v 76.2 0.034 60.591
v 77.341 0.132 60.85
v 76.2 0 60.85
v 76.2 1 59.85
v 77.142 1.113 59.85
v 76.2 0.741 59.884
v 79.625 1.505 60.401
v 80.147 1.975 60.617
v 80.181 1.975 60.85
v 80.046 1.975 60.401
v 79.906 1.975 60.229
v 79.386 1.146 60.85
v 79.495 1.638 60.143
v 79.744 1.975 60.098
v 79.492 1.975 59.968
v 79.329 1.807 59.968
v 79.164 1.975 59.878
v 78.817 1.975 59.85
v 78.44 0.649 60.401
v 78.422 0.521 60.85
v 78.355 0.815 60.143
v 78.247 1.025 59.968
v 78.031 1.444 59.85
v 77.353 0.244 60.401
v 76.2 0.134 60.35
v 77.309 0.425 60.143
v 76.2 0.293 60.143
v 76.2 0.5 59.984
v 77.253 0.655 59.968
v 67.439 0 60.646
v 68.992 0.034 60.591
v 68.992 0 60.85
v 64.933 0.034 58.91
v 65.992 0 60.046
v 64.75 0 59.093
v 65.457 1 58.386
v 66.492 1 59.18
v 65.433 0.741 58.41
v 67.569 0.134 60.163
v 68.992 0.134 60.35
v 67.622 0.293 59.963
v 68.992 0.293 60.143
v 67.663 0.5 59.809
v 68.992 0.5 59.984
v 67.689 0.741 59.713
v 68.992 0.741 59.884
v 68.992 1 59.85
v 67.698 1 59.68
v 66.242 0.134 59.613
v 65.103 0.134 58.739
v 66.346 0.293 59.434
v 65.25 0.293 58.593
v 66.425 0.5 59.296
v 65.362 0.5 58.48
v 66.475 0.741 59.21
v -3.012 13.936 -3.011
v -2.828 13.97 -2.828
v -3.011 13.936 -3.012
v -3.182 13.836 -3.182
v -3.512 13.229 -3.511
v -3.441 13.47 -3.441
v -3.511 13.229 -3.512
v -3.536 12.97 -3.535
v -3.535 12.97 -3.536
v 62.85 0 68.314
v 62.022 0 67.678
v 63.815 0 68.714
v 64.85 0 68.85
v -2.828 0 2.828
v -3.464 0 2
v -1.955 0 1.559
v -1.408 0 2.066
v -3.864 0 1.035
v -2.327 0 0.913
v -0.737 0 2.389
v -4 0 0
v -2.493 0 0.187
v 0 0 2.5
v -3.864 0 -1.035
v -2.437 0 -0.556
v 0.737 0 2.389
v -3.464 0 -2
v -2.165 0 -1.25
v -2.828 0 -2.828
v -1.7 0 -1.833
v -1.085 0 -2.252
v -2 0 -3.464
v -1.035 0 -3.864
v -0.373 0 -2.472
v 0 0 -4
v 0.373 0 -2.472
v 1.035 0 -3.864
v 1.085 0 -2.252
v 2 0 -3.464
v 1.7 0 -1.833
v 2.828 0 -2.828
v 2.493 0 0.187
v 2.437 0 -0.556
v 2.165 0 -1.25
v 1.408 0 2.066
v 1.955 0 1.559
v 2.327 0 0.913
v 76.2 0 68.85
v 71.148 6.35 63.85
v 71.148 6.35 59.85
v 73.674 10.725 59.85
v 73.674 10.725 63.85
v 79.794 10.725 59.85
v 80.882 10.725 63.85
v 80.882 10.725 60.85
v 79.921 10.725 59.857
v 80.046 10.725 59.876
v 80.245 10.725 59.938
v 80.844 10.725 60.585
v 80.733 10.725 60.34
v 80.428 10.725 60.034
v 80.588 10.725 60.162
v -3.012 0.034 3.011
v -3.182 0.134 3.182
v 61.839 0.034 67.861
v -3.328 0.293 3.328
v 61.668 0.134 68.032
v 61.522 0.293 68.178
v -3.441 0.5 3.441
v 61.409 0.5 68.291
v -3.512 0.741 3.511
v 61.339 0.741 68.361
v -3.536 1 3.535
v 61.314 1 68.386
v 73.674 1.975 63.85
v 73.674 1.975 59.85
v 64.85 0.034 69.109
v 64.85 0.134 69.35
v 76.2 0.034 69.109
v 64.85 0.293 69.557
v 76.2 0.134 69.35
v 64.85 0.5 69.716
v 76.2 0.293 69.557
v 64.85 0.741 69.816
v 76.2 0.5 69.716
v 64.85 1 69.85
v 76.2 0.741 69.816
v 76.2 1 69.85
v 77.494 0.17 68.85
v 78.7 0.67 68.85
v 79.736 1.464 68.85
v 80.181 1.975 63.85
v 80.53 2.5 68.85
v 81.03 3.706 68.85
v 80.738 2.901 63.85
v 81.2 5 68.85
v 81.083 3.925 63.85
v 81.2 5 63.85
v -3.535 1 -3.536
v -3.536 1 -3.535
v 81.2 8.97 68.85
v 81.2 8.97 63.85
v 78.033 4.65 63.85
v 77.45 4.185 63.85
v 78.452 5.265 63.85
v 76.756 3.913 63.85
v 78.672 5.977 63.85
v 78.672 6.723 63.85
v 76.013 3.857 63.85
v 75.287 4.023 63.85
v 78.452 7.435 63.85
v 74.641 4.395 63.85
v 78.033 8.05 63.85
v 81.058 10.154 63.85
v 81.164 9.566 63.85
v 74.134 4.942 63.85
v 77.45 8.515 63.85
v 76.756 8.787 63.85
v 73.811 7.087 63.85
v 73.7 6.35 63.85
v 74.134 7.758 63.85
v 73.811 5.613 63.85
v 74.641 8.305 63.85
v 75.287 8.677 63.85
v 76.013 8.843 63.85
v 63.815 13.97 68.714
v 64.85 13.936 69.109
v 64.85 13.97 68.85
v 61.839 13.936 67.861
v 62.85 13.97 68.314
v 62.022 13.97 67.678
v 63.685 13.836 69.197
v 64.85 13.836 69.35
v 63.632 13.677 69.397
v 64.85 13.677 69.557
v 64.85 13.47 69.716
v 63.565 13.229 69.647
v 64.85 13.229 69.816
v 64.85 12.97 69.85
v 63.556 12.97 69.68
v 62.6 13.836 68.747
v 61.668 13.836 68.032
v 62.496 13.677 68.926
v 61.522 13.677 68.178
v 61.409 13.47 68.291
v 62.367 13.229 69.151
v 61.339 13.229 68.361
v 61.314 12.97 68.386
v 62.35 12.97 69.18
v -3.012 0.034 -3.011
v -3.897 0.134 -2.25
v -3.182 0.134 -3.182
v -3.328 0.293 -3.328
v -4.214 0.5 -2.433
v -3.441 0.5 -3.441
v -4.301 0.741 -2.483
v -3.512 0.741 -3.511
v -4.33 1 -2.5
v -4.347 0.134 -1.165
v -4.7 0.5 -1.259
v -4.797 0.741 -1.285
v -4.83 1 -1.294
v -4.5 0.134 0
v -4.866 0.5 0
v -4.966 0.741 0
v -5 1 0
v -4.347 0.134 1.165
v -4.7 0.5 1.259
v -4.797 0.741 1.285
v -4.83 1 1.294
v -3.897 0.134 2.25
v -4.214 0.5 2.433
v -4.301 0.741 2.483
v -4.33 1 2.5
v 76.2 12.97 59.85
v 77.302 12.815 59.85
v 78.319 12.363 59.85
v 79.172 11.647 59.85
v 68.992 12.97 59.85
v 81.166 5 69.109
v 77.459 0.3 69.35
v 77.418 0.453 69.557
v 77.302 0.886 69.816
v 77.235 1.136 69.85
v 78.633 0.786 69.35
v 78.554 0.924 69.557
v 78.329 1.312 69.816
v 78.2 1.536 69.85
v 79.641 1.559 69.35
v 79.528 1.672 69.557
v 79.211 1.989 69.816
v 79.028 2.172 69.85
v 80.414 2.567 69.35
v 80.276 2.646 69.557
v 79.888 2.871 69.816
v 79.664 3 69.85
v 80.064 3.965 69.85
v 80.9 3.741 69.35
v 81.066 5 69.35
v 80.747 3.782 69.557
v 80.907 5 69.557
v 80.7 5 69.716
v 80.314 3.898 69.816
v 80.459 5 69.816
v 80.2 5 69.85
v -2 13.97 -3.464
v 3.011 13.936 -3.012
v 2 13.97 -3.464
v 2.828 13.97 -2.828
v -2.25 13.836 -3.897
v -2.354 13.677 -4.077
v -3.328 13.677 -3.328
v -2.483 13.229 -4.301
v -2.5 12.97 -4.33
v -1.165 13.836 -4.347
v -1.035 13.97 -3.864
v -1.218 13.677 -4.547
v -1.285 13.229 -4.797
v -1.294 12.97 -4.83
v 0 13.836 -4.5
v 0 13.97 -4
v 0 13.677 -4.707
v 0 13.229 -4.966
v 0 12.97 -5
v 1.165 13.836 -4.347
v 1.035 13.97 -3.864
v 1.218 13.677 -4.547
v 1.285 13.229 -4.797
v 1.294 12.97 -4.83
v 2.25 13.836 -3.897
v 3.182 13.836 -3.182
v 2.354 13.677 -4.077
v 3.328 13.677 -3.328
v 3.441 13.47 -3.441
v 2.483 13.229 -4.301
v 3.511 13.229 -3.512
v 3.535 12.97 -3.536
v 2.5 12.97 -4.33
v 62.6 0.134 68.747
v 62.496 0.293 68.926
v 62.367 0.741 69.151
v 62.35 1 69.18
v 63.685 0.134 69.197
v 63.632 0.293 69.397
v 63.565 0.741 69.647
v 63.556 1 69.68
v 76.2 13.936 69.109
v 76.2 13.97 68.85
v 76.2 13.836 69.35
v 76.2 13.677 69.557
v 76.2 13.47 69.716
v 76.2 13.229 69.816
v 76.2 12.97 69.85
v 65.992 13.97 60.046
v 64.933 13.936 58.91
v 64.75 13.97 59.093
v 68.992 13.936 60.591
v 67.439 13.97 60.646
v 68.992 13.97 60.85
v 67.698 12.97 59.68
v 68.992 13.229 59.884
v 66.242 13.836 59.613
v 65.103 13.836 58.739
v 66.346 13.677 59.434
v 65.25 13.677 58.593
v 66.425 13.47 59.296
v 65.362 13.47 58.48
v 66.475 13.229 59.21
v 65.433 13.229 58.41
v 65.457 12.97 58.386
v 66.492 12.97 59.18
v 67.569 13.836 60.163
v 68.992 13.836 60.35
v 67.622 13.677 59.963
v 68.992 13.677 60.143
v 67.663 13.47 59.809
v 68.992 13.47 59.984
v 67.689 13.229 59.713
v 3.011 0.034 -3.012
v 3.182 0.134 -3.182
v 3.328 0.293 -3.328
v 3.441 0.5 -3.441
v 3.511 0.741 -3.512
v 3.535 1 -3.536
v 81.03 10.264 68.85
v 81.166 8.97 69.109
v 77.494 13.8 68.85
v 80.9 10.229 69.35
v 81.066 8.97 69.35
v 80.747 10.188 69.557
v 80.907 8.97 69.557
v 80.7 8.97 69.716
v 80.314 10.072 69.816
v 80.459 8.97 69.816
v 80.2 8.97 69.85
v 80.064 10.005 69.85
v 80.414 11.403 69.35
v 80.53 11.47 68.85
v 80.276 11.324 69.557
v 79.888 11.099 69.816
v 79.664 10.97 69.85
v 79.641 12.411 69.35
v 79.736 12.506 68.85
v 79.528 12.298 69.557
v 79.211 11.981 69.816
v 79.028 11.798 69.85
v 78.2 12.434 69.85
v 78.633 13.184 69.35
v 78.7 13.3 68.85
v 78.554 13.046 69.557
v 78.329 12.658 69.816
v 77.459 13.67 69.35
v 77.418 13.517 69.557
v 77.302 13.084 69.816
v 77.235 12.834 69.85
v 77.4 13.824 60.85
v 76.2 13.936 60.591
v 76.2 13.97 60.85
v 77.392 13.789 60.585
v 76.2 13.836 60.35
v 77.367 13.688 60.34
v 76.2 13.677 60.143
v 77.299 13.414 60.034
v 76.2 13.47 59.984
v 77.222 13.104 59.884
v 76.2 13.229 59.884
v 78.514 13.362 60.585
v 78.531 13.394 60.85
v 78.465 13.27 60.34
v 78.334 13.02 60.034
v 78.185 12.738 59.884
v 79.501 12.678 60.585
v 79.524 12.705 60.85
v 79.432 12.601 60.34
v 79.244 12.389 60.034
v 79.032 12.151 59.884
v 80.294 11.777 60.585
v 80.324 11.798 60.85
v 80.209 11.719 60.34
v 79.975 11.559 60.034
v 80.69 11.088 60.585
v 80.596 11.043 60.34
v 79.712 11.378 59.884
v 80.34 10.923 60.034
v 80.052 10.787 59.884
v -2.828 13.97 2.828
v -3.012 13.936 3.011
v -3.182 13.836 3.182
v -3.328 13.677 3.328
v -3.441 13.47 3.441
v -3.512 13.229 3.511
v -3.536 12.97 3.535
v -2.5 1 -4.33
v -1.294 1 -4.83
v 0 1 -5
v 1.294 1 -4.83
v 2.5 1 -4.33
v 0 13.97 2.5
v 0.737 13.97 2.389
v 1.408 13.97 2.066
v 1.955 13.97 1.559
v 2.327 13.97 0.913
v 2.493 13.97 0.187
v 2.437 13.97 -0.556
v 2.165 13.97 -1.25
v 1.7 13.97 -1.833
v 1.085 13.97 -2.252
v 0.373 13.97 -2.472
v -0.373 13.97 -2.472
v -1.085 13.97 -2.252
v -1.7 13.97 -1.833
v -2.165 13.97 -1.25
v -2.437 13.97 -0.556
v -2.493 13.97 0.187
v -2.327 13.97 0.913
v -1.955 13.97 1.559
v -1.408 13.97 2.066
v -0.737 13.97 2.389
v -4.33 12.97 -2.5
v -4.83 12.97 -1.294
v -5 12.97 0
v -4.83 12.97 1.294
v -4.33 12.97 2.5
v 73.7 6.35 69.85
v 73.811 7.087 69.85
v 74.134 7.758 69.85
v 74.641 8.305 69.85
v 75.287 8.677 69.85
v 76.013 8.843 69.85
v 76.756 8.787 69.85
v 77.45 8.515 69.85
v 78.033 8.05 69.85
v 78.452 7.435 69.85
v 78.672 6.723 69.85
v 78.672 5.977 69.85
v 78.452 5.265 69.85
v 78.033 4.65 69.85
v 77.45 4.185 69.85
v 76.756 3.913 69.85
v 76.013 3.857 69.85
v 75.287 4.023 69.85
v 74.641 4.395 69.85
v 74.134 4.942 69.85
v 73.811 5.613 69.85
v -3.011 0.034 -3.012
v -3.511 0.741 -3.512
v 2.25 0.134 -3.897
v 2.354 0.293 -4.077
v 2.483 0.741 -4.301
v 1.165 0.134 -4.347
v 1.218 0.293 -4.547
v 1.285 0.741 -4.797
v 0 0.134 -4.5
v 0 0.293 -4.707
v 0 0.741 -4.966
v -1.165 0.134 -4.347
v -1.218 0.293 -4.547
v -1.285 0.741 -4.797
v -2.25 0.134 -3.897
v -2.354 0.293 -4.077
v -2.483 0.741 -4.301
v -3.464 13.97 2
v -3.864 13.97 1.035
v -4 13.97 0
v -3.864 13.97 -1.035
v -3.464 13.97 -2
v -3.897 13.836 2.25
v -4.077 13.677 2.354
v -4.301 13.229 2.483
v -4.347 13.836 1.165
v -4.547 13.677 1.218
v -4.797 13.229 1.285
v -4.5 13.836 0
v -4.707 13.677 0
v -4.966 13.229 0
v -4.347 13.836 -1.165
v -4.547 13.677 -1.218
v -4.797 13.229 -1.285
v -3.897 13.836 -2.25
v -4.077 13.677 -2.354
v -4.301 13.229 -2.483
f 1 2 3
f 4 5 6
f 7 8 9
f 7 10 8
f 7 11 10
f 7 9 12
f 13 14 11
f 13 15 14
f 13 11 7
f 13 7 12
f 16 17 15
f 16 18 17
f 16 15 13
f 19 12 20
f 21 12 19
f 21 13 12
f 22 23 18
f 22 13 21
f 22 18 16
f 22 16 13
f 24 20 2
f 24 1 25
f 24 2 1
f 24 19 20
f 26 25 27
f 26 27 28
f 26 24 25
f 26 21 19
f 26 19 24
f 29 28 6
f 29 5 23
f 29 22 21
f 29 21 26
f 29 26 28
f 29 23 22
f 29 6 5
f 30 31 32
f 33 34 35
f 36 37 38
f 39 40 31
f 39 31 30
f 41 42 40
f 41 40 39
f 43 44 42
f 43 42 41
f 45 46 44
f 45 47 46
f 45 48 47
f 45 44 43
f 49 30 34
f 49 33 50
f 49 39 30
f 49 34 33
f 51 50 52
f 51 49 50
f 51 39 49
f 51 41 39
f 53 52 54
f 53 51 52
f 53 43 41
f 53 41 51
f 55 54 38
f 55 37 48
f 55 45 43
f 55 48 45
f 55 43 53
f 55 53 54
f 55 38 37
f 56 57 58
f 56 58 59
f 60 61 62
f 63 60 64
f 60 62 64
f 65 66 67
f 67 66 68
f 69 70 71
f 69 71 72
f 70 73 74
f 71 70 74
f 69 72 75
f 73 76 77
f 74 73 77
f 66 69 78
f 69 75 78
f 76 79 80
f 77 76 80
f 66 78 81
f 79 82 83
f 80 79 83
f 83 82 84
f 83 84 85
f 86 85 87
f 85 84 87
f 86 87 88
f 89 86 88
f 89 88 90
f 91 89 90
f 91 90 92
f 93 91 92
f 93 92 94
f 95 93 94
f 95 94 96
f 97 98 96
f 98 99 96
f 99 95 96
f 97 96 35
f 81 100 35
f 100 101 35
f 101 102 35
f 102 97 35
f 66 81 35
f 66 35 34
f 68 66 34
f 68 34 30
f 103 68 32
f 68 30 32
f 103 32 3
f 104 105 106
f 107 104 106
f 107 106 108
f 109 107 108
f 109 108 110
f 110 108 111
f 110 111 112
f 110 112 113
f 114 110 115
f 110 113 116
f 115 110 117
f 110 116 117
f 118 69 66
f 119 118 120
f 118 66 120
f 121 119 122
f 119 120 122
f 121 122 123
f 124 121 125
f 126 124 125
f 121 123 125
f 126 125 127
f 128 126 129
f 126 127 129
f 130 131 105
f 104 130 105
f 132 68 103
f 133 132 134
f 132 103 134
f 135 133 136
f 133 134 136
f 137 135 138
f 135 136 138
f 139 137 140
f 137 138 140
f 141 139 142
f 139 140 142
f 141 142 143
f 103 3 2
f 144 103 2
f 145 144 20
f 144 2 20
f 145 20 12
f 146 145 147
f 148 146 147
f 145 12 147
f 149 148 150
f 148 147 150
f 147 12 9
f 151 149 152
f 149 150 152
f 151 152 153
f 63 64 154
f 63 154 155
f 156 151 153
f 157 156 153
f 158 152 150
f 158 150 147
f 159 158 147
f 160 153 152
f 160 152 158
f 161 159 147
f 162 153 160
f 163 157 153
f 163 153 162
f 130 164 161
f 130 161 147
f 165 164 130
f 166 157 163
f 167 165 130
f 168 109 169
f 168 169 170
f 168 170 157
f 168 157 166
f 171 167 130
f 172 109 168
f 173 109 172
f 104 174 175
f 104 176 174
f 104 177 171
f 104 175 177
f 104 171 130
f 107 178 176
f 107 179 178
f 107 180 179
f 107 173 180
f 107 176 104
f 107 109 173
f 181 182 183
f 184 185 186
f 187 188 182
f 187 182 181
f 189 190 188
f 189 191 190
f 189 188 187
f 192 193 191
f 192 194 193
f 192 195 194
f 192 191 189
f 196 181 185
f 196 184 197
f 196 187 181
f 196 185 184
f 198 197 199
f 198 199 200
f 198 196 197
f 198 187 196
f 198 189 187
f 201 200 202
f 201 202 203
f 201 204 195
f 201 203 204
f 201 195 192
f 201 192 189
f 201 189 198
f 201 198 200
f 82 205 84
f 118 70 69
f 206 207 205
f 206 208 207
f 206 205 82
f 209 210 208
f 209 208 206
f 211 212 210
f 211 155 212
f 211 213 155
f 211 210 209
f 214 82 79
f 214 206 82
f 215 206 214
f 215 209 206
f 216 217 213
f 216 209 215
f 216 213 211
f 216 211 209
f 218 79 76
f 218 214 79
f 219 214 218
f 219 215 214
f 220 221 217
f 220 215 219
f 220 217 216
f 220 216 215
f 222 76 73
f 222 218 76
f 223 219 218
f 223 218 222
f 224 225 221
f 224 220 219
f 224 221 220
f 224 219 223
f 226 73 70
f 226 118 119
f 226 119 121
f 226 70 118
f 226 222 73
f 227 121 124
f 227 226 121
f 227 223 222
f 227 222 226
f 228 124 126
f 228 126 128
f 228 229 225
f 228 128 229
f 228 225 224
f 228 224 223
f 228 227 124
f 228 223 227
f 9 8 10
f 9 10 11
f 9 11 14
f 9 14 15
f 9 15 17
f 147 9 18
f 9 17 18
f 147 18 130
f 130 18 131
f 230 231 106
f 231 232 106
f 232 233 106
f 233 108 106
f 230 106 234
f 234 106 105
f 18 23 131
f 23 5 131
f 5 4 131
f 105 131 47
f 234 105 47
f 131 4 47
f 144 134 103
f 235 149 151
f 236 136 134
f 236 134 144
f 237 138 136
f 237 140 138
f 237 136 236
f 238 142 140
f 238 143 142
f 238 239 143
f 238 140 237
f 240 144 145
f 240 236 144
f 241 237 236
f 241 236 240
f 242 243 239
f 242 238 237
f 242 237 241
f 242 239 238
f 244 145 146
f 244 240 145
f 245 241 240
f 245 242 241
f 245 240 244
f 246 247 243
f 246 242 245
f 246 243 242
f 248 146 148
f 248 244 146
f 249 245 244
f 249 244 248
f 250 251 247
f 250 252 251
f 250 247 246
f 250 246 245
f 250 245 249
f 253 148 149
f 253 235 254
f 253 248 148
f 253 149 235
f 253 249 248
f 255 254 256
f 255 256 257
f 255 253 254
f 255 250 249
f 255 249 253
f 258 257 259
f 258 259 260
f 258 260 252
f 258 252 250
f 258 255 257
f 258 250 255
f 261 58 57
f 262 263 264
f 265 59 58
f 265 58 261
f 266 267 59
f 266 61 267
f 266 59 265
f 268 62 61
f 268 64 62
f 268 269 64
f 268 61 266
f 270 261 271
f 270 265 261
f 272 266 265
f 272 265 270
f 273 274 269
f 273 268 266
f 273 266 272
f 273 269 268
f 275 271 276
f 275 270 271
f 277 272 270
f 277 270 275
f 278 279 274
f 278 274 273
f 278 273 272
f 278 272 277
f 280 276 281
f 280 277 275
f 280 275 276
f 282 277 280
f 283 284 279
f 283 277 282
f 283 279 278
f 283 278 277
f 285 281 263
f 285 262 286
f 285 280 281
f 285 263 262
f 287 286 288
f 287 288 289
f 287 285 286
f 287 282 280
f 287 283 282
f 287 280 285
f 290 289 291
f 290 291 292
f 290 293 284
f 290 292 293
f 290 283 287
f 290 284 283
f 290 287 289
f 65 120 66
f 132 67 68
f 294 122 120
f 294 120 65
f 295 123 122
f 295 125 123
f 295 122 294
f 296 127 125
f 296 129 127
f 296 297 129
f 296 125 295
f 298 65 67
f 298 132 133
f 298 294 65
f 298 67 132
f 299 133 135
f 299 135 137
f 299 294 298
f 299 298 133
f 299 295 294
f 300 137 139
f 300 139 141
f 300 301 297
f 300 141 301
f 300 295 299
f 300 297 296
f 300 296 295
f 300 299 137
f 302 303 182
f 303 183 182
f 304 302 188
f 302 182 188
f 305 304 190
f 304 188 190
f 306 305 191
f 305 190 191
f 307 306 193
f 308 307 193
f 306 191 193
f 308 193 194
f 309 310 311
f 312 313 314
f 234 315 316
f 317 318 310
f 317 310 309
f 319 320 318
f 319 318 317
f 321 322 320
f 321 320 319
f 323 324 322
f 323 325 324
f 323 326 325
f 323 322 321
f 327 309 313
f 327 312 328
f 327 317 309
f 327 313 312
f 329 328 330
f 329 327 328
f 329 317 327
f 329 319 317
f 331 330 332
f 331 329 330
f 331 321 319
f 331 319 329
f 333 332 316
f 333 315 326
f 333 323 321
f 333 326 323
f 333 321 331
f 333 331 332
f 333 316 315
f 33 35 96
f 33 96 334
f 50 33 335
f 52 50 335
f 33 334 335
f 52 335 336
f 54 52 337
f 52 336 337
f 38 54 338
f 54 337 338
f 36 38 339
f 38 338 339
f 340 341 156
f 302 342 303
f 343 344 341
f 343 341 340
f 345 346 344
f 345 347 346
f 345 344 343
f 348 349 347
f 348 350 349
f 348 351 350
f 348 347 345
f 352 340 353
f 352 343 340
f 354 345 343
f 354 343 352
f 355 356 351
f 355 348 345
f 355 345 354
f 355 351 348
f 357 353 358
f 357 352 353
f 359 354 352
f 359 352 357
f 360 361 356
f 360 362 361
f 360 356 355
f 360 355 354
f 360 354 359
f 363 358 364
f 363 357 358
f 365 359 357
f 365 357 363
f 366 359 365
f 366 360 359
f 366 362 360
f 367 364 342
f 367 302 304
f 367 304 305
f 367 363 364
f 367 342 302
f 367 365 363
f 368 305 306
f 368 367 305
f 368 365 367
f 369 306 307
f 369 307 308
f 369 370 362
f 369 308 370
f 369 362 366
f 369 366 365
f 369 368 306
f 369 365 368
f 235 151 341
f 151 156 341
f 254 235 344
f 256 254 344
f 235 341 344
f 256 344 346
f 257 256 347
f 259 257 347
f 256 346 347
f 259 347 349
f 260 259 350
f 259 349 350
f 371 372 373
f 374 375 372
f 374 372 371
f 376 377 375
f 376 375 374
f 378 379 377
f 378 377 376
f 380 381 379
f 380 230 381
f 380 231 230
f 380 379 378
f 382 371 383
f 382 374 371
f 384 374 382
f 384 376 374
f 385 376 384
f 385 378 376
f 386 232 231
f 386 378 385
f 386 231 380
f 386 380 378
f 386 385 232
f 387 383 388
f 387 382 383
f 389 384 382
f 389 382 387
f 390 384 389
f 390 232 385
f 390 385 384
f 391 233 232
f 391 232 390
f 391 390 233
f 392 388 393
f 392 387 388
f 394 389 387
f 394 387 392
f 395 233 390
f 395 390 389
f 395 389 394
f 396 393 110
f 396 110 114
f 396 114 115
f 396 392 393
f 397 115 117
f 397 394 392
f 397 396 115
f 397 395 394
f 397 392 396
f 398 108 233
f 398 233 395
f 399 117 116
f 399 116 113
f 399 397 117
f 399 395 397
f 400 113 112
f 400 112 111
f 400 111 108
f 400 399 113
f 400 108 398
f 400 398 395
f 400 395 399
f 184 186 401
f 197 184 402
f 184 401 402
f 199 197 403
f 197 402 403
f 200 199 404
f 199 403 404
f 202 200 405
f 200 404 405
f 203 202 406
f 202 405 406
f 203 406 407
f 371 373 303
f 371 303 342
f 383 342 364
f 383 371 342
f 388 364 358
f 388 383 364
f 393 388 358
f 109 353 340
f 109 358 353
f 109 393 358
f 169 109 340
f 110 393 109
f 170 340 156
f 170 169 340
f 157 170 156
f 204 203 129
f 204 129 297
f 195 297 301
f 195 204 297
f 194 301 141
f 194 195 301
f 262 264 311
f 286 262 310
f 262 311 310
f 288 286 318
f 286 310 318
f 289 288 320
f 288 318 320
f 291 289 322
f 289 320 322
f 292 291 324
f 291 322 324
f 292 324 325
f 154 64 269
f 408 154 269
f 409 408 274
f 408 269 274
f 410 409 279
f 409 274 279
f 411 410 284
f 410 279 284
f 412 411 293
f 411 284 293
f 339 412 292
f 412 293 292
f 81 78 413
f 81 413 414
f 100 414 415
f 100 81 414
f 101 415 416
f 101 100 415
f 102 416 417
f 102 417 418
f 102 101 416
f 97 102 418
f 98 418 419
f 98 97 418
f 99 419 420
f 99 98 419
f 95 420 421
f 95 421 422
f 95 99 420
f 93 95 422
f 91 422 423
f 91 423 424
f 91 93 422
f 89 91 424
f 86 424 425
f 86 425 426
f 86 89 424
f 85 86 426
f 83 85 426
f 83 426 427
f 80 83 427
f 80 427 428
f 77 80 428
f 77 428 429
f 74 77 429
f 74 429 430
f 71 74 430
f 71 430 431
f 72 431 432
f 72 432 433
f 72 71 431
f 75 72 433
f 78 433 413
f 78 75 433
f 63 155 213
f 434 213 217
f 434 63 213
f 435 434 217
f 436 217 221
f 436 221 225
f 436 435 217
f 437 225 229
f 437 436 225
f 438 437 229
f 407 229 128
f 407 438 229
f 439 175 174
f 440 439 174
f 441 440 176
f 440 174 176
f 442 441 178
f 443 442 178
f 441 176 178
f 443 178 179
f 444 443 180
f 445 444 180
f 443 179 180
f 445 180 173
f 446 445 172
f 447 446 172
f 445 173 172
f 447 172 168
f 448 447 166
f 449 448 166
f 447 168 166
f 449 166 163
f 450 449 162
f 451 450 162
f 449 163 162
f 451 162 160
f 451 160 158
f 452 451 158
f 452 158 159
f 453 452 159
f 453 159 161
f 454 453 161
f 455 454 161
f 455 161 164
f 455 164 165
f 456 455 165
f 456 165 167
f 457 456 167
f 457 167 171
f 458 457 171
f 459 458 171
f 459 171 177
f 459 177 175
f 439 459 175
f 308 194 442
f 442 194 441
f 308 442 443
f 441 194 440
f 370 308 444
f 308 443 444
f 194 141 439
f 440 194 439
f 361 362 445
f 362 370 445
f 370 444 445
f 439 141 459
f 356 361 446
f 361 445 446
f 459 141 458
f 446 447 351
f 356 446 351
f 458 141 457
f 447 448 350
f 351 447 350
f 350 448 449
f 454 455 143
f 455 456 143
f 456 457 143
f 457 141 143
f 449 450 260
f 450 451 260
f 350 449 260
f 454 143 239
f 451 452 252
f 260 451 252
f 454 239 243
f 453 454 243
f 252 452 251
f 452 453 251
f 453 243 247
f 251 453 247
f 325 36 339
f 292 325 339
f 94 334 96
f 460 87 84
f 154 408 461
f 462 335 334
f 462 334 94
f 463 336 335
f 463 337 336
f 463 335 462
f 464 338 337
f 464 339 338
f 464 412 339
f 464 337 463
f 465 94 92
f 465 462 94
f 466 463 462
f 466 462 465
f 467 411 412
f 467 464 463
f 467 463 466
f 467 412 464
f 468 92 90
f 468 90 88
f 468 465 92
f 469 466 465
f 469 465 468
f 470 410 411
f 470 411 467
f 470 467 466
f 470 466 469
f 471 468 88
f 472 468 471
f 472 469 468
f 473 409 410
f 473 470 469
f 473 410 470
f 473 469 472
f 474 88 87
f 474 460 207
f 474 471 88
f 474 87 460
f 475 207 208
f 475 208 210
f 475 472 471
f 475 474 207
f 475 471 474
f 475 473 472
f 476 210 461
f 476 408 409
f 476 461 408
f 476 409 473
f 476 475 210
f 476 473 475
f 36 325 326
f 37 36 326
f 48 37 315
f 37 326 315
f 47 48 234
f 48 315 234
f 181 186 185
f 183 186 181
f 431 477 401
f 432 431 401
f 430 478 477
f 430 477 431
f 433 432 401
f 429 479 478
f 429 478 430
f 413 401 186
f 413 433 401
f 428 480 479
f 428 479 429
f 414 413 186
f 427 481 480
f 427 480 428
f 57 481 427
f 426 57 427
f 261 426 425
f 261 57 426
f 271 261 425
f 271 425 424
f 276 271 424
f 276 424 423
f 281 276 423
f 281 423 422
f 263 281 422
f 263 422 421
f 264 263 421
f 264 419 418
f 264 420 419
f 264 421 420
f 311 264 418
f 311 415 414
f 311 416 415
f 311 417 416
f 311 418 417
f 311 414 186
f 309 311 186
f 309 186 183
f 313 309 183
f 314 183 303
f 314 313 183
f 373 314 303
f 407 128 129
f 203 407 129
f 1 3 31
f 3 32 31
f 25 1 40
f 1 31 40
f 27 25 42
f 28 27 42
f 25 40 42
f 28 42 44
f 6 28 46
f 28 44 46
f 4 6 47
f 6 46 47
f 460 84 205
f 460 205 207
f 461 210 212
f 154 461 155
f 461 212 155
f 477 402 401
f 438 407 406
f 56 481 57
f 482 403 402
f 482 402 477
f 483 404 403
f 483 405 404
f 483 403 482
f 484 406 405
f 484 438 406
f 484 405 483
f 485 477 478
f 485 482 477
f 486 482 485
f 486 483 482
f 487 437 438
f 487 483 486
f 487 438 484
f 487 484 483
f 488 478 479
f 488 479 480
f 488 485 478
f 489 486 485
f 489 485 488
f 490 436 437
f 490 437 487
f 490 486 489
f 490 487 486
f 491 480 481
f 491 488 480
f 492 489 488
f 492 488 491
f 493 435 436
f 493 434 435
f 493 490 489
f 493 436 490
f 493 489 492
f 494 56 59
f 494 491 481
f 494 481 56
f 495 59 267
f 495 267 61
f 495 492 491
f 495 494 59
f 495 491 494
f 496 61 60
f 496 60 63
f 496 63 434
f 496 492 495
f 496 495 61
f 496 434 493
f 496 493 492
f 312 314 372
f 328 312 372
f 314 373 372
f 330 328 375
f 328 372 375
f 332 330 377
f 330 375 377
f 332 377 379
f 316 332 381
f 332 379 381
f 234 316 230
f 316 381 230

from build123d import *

# Parameters (mm, degrees)
SKETCH1_R           = 2.5
BOSS_EXTRUDE1_DEPTH = 13.97
CUT_EXTRUDE1_REACH  = 108.146
SKETCH2_R           = 2.5
FILLET1_R           = 5
FILLET2_R           = 1
SKETCH3_R           = 2.5
CUT_EXTRUDE2_DEPTH  = 4


with BuildPart() as part:
    # Sketch1 → Boss-Extrude1 (new body)
    with BuildSketch(Plane(origin=(0, 0, 0), x_dir=(1, 0, 0), z_dir=(0, 1, 0))):
        Polygon((0, 7.071067812), (-7.071067812, 0), (62.778932188, -69.85), (81.2, -69.85), (81.2, -59.85), (66.921067812, -59.85), align=None)
        with Locations(Location((0, 0, 0), (0, 0, 270))):
            Circle(SKETCH1_R, mode=Mode.SUBTRACT)
    extrude(amount=BOSS_EXTRUDE1_DEPTH)

    # Sketch2 → Cut-Extrude1 (cut, up to next)
    with BuildSketch(Plane(origin=(0, 0, 59.85), x_dir=(-1, 0, 0), z_dir=(0, 0, -1)), mode=Mode.PRIVATE) as cut_extrude1_sk1:
        with Locations((-76.2, 6.35)):
            Circle(SKETCH2_R)
    cut_extrude1_tool1 = extrude(cut_extrude1_sk1.sketch, amount=-CUT_EXTRUDE1_REACH, mode=Mode.PRIVATE) & part.part
    add(cut_extrude1_tool1.solids().sort_by_distance((76.2, 6.35, 59.85))[0], mode=Mode.SUBTRACT)

    # Fillet1
    fillet1_edges = [part.edges().sort_by_distance(p)[0] for p in [
        (-7.071067812, 6.985, 0),
        (0, 6.985, -7.071067812),
        (81.2, 0, 64.85),
        (81.2, 13.97, 64.85),
        (62.778932188, 6.985, 69.85),
        (66.921067812, 6.985, 59.85),
    ]]
    fillet(fillet1_edges, radius=FILLET1_R - 0.0001)  # a hair under: the kernel refuses the full size

    # Fillet2
    fillet2_edges = [part.edges().sort_by_distance(p)[0] for p in [
        (28.889445383, 0, 35.960513195),
        (28.889445383, 13.97, 35.960513195),
        (70.525029289, 0, 69.85),
        (34.496047101, 0, 27.424979289),
        (72.596097101, 0, 59.85),
        (62.936579685, 0, 69.469405275),
        (0, 0, -5.000041421),
        (-5.000041421, 0, 0),
        (72.596097101, 13.97, 59.85),
        (34.496047101, 13.97, 27.424979289),
        (70.525029289, 13.97, 69.85),
        (62.936579685, 13.97, 69.469405275),
        (0, 13.97, -5.000041421),
        (-5.000041421, 13.97, 0),
        (81.2, 6.985, 59.85),
        (81.2, 6.985, 69.85),
        (79.735563195, 12.505563195, 59.85),
        (79.735563195, 1.464436805, 59.85),
        (79.735563195, 12.505563195, 69.85),
        (79.735563195, 1.464436805, 69.85),
        (67.078715309, 0, 59.469405275),
        (67.078715309, 13.97, 59.469405275),
    ]]
    fillet(fillet2_edges, radius=FILLET2_R)

    # Sketch3 → Cut-Extrude2 (cut)
    # profile 1 of 5: a face of its own
    with BuildSketch(Plane(origin=(0, 0, 59.85), x_dir=(-1, 0, 0), z_dir=(0, 0, -1))):
        with BuildLine():
            Line((-80.164228202, 4.466244658), (-78.725907428, 1.975))
            Line((-78.725907428, 1.975), (-73.674092572, 1.975))
            Line((-73.674092572, 1.975), (-71.148185145, 6.35))
            Line((-71.148185145, 6.35), (-73.674092572, 10.725))
            Line((-73.674092572, 10.725), (-78.725907428, 10.725))
            Line((-78.725907428, 10.725), (-80.2, 8.17179677))
            Line((-80.2, 8.17179677), (-80.2, 5))
            ThreePointArc((-80.2, 5), (-80.191047031, 4.732523652), (-80.164228202, 4.466244658))
        make_face()
        with Locations((-76.2, 6.35)):
            Circle(SKETCH3_R, mode=Mode.SUBTRACT)
    # profile 2 of 5: a face of its own
    with BuildSketch(Plane(origin=(0, 0, 59.85), x_dir=(-1, 0, 0), z_dir=(0, 0, -1))):
        with BuildLine():
            Line((-82.608963745, 1.975), (-78.817131063, 1.975))
            ThreePointArc((-78.817131063, 1.975), (-79.718543367, 3.097408985), (-80.164228202, 4.466244658))
            Line((-80.164228202, 4.466244658), (-81.251814855, 6.35))
            Line((-81.251814855, 6.35), (-80.2, 8.17179677))
            Line((-80.2, 8.17179677), (-80.2, 8.97))
            ThreePointArc((-80.2, 8.97), (-80.097290514, 9.870625701), (-79.794436674, 10.725))
            Line((-79.794436674, 10.725), (-82.608963745, 10.725))
            Line((-82.608963745, 10.725), (-82.608963745, 1.975))
        make_face()
    # profile 3 of 5: a face of its own
    with BuildSketch(Plane(origin=(0, 0, 59.85), x_dir=(-1, 0, 0), z_dir=(0, 0, -1))):
        with BuildLine():
            Line((-81.251814855, 6.35), (-80.164228202, 4.466244658))
            ThreePointArc((-80.164228202, 4.466244658), (-80.191047031, 4.732523652), (-80.2, 5))
            Line((-80.2, 5), (-80.2, 8.17179677))
            Line((-80.2, 8.17179677), (-81.251814855, 6.35))
        make_face()
    # profile 4 of 5: a face of its own
    with BuildSketch(Plane(origin=(0, 0, 59.85), x_dir=(-1, 0, 0), z_dir=(0, 0, -1))):
        with BuildLine():
            Line((-80.2, 8.97), (-80.2, 8.17179677))
            Line((-80.2, 8.17179677), (-78.725907428, 10.725))
            Line((-78.725907428, 10.725), (-79.794436674, 10.725))
            ThreePointArc((-79.794436674, 10.725), (-80.097290514, 9.870625701), (-80.2, 8.97))
        make_face()
    # profile 5 of 5: a face of its own
    with BuildSketch(Plane(origin=(0, 0, 59.85), x_dir=(-1, 0, 0), z_dir=(0, 0, -1))):
        with BuildLine():
            Line((-78.817131063, 1.975), (-78.725907428, 1.975))
            Line((-78.725907428, 1.975), (-80.164228202, 4.466244658))
            ThreePointArc((-80.164228202, 4.466244658), (-79.718543367, 3.097408985), (-78.817131063, 1.975))
        make_face()
    extrude(amount=-CUT_EXTRUDE2_DEPTH, mode=Mode.SUBTRACT)


solid = part.part
